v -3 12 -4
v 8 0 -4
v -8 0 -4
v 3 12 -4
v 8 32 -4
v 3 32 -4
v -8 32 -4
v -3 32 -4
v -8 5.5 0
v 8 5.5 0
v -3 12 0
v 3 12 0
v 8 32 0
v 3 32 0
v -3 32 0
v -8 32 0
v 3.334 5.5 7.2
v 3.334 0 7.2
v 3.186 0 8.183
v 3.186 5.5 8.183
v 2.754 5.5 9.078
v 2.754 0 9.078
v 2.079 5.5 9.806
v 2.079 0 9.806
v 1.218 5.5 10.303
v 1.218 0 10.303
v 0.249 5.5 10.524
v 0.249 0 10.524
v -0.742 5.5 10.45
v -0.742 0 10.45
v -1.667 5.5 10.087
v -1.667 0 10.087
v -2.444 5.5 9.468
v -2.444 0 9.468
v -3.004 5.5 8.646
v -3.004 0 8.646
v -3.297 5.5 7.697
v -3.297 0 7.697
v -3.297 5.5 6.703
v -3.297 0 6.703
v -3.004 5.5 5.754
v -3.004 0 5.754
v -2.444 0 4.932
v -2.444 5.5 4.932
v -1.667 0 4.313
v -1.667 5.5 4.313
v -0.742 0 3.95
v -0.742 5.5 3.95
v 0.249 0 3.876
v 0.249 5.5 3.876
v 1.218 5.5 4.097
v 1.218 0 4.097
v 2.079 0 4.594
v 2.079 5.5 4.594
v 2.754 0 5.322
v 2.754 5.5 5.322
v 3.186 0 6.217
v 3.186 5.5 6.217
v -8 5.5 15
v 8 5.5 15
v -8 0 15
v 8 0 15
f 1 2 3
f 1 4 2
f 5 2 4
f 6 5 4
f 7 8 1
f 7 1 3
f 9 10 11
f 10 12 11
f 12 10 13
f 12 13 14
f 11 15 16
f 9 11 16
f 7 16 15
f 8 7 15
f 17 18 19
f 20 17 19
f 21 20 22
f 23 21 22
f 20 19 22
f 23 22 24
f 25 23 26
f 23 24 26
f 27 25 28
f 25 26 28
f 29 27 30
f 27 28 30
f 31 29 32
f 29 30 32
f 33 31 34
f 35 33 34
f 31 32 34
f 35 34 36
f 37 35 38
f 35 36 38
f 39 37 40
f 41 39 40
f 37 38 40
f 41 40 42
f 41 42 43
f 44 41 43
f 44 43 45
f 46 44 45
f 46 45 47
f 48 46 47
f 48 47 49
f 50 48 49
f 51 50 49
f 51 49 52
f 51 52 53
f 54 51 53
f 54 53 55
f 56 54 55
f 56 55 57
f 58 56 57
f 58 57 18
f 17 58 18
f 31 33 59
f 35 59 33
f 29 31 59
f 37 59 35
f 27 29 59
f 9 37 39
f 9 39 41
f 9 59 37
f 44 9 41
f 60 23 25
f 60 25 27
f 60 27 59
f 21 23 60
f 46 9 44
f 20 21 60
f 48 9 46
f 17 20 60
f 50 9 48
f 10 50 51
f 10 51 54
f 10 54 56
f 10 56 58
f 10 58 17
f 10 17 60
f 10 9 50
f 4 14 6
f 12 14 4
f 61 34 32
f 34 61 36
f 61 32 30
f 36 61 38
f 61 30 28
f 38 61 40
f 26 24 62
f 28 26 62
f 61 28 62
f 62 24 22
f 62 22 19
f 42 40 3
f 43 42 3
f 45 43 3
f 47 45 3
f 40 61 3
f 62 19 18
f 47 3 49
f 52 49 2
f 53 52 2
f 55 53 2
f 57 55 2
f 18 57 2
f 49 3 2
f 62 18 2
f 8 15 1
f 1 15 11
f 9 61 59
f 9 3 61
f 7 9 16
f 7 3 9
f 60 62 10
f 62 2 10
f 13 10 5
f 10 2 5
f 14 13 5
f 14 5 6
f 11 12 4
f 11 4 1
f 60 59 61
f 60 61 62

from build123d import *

# Parameters (mm, degrees)
F0_W     = 3
F0_H     = 12
F1_DEPTH = 4
F3_W     = 16
F3_H     = 5.5
F4_DEPTH = 15
F5_R     = 3.33375
F6_DEPTH = 32.001


with BuildPart() as f1:
    # F0 (on Top) → F1 (new body)
    with BuildSketch(Plane.XY):
        with Locations((1.5, 6)):
            Rectangle(F0_W, F0_H)
        Polygon((3, 12), (3, 0), (8, 0), (8, 32), (3, 32), align=None)
    extrude(amount=-F1_DEPTH)

    # F2: F1 across face


with BuildPart() as f1_1:
    add(f1.part)
    add(f1.part.mirror(Plane(origin=(0, 6, -2), x_dir=(0, -1, 0), z_dir=(-1, 0, 0))))

    # F3 (on face) → F4 (join)
    with BuildSketch(Plane.XY):
        with Locations((0, 2.75)):
            Rectangle(F3_W, F3_H)
    extrude(amount=F4_DEPTH)

    # F5 (on Front) → F6 (cut, through all)
    with BuildSketch(Plane.XZ):
        with Locations((0, 7.2)):
            Circle(F5_R)
    extrude(amount=-F6_DEPTH, mode=Mode.SUBTRACT)


solid = f1_1.part
